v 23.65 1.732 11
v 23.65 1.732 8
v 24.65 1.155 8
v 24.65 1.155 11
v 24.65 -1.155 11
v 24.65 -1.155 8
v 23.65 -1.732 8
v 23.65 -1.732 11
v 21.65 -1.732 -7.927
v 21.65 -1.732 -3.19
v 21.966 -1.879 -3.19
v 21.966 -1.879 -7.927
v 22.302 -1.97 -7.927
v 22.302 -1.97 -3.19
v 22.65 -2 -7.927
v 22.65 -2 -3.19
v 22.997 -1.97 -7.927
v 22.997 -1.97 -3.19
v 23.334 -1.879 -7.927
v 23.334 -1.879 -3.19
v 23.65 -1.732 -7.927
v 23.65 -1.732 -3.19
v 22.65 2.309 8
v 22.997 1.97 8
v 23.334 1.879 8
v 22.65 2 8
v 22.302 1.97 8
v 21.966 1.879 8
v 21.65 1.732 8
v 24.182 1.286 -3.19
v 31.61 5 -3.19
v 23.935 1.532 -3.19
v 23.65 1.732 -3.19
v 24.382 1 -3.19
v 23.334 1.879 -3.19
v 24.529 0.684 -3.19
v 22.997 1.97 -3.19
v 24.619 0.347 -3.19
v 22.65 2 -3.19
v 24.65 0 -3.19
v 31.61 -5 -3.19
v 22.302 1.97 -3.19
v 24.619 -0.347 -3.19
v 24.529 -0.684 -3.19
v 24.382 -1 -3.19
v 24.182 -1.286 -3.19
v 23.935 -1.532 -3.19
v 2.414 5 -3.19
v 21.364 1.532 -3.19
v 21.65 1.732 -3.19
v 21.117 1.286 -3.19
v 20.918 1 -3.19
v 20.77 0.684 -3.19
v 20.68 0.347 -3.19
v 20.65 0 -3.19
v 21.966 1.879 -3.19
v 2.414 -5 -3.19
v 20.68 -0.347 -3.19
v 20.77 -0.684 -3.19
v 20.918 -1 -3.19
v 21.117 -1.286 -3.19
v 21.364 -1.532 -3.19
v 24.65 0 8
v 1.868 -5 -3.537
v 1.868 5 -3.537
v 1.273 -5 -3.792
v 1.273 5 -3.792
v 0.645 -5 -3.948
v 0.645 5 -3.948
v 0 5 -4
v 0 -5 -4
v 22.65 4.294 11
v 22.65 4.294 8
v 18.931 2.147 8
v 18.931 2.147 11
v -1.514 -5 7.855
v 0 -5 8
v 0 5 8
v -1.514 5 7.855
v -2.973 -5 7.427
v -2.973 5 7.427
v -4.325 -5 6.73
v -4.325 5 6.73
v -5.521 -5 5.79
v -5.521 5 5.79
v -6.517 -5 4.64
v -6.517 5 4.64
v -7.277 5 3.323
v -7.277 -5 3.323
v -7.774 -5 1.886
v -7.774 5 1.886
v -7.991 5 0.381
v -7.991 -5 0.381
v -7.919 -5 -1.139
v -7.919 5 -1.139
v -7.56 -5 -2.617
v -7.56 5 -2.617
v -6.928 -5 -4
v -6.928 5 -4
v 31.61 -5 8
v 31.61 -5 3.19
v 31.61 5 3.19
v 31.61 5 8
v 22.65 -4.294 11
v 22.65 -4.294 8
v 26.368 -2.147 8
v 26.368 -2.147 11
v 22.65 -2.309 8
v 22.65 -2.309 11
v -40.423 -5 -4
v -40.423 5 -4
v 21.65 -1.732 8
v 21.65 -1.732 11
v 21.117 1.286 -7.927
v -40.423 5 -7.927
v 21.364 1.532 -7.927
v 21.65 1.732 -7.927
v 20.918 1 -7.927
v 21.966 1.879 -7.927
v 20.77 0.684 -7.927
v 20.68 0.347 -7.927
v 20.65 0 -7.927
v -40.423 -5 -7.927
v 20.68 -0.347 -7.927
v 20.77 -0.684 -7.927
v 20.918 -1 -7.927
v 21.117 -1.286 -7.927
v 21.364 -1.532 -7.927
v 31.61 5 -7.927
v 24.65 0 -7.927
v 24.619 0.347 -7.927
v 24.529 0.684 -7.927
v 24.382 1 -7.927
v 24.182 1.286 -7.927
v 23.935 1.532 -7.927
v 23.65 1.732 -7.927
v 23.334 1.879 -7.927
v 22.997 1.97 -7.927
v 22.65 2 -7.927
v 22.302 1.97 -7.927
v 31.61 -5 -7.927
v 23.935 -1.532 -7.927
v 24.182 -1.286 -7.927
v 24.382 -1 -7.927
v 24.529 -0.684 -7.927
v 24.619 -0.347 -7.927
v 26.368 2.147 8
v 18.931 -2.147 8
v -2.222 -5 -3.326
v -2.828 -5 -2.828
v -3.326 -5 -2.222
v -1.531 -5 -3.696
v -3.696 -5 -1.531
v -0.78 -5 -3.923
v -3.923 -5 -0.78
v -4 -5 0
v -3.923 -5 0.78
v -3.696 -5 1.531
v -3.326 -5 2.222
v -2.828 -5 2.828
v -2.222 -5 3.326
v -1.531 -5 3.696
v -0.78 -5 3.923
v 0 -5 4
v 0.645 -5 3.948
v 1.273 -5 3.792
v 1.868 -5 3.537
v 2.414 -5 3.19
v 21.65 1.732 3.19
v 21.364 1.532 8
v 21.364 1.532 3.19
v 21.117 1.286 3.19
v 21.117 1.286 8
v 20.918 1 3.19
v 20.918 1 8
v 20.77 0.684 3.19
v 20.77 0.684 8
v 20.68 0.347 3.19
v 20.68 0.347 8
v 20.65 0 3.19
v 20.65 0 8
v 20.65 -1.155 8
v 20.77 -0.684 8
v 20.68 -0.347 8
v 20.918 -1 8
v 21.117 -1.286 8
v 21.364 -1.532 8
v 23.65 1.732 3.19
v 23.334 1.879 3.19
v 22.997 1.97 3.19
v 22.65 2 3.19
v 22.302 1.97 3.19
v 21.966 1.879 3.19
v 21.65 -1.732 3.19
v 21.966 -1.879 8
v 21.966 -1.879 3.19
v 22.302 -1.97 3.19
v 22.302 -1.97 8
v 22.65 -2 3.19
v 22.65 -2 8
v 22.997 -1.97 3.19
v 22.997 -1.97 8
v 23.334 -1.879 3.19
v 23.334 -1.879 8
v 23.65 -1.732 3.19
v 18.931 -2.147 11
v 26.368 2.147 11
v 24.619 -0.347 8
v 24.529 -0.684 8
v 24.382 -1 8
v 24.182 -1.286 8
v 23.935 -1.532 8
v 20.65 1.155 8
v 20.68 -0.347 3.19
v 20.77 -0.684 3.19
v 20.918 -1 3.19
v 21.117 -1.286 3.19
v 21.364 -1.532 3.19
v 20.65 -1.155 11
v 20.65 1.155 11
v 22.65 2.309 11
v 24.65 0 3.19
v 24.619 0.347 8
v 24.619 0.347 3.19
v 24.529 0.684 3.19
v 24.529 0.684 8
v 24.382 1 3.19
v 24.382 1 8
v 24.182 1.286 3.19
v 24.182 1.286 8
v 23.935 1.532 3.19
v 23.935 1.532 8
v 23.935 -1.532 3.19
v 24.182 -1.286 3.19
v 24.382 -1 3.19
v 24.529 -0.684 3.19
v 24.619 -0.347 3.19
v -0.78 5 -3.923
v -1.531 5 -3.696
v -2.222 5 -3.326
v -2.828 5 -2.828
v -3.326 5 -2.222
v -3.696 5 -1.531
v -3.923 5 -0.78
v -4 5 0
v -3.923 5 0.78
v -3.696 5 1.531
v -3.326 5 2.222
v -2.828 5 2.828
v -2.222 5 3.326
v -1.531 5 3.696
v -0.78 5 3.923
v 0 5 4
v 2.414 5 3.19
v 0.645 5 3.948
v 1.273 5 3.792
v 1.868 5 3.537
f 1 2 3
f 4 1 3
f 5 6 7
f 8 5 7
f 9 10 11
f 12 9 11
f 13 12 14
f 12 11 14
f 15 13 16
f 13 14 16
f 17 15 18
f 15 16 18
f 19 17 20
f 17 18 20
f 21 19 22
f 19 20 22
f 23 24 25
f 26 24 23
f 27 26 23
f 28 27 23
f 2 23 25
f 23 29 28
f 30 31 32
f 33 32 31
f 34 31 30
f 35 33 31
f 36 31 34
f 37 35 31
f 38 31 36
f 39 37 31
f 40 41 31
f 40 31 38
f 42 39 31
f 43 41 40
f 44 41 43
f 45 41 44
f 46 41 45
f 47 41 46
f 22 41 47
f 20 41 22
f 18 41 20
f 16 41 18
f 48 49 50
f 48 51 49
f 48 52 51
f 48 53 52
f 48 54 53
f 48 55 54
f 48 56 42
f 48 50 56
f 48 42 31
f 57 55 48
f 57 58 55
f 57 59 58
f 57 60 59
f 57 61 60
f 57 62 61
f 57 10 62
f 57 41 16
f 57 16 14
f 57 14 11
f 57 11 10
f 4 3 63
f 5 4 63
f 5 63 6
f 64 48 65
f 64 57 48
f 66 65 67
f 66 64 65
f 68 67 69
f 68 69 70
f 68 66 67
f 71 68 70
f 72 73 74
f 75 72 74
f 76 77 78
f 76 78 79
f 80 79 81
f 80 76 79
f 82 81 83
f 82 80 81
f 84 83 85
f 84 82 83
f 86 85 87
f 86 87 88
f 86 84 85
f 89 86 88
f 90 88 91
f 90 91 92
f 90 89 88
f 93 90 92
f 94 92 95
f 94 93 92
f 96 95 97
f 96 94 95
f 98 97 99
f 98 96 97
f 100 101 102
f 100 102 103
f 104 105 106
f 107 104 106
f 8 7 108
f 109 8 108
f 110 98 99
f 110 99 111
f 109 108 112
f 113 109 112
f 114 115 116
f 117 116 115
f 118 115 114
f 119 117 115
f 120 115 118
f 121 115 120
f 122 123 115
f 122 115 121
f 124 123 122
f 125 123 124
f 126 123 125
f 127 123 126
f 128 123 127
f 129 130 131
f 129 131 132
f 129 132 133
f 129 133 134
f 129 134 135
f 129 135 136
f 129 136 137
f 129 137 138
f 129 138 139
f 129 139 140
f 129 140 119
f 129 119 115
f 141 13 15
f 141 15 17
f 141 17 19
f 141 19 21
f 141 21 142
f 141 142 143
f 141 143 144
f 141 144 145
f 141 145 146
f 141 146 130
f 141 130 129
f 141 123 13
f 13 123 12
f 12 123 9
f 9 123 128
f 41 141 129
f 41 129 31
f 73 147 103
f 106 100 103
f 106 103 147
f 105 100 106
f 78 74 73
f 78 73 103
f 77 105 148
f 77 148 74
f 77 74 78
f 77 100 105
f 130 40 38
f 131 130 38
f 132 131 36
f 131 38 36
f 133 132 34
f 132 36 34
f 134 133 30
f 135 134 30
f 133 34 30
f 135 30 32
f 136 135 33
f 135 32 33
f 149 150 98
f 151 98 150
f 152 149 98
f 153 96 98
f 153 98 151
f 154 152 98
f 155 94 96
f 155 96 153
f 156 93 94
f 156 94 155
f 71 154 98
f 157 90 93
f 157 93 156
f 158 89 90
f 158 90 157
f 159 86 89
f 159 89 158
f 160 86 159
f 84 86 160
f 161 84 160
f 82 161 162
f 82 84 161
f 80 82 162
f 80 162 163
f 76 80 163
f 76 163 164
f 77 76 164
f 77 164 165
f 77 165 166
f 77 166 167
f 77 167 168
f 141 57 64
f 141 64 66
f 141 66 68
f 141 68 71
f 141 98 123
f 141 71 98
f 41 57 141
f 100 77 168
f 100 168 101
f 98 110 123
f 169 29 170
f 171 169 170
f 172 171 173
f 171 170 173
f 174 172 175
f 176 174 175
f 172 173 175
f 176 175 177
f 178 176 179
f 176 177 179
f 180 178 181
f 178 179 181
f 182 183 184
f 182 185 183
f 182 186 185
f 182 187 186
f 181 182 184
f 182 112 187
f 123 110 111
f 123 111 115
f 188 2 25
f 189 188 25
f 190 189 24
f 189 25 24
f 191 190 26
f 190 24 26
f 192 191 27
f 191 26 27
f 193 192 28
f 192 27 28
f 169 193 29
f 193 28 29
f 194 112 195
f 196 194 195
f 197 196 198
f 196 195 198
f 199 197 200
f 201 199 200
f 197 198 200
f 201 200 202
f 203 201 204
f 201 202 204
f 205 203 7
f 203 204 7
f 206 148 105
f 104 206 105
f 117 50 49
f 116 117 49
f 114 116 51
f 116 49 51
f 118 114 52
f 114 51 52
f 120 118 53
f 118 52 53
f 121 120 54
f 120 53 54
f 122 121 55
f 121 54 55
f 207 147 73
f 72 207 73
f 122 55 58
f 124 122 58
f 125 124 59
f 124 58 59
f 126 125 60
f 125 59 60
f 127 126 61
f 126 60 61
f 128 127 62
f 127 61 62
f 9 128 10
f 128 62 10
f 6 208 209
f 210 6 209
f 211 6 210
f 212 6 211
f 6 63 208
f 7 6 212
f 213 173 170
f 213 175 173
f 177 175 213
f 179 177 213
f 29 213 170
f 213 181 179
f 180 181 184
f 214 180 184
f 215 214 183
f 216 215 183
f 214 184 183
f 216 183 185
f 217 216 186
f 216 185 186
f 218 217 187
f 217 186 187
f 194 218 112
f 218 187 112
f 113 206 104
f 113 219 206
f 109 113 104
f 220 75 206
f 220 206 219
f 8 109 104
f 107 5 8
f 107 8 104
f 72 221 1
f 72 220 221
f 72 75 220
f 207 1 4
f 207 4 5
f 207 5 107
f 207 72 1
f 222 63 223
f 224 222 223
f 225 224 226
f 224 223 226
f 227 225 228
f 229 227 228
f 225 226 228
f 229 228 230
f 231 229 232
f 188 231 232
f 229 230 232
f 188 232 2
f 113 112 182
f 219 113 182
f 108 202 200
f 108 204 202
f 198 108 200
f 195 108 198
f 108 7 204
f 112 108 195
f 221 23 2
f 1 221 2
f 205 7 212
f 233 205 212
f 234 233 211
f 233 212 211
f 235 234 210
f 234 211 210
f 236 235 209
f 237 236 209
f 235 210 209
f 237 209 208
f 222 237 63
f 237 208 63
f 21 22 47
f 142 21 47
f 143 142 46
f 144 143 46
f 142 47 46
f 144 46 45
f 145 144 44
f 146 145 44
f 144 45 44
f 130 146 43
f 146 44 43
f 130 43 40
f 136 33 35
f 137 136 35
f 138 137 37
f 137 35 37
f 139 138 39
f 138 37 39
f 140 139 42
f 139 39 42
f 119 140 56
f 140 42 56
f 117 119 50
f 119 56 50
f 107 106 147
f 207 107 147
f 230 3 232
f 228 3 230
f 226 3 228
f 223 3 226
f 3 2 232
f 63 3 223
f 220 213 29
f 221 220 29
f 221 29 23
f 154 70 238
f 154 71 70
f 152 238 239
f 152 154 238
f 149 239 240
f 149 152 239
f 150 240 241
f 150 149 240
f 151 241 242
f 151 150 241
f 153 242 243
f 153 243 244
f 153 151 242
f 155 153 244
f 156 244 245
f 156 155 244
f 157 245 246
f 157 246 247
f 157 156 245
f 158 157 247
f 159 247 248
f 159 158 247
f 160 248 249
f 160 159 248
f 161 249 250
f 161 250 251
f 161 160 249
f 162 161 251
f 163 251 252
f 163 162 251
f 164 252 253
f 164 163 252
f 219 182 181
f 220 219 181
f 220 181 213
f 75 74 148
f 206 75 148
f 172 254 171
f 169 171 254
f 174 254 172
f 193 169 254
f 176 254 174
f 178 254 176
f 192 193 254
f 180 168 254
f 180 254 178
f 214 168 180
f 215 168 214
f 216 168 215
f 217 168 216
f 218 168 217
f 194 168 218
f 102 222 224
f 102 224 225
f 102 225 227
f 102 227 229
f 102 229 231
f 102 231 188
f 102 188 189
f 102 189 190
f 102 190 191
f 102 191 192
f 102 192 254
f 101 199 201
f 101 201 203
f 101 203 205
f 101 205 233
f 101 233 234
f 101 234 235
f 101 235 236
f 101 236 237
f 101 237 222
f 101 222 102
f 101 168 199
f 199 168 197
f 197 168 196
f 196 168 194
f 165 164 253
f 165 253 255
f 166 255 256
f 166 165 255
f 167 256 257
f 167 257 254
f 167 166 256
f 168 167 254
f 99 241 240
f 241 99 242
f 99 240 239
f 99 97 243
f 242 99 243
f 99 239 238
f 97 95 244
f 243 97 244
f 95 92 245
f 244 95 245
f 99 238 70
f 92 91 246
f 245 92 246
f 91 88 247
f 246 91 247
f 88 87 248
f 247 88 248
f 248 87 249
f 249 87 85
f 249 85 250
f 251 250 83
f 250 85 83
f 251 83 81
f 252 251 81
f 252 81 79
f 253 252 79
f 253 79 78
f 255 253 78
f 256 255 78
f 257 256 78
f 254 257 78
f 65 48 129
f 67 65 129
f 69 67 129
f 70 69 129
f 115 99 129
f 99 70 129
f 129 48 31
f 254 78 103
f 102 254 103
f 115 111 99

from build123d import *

# Parameters (mm, degrees)
F1_DEPTH = 5
F3_DEPTH = 3
F4_DEPTH = 16


with BuildPart() as f1:
    # F0 (on Front) → F1 (new body, symmetric)
    with BuildSketch(Plane.XZ):
        with BuildLine():
            ThreePointArc((0, -4), (-4, 0), (0, 4))
            Line((0, 4), (0, 8))
            ThreePointArc((0, 8), (-6.9282032303, 4), (-6.9282032303, -4))
            Line((-6.9282032303, -4), (0, -4))
        make_face()
        with BuildLine():
            Line((31.6095426679, 8), (0, 8))
            ThreePointArc((0, 8), (4, 6.9282032303), (6.9282032303, 4))
            Line((6.9282032303, 4), (31.6095426679, 4))
            Line((31.6095426679, 4), (31.6095426679, 8))
        make_face()
        with BuildLine():
            Line((0, 8), (0, 4))
            Line((0, 4), (2.413712136, 4))
            Line((2.413712136, 4), (6.9282032303, 4))
            ThreePointArc((6.9282032303, 4), (4, 6.9282032303), (0, 8))
        make_face()
        with BuildLine():
            Line((31.6095426679, -4), (6.9282032303, -4))
            ThreePointArc((6.9282032303, -4), (4.4598401279, -6.6415228701), (1.0806620306, -7.9266745597))
            Line((1.0806620306, -7.9266745597), (31.6095426679, -7.9266745597))
            Line((31.6095426679, -7.9266745597), (31.6095426679, -4))
        make_face()
        with BuildLine():
            ThreePointArc((-1.0806620306, -7.9266745597), (-4.4598401279, -6.6415228701), (-6.9282032303, -4))
            Line((-6.9282032303, -4), (-40.4233634472, -4))
            Line((-40.4233634472, -4), (-40.4233634472, -7.9266745597))
            Line((-40.4233634472, -7.9266745597), (-1.0806620306, -7.9266745597))
        make_face()
        with BuildLine():
            Line((0, -7.9266745597), (0, -4))
            Line((0, -4), (-6.9282032303, -4))
            ThreePointArc((-6.9282032303, -4), (-4.4598401279, -6.6415228701), (-1.0806620306, -7.9266745597))
            Line((-1.0806620306, -7.9266745597), (0, -7.9266745597))
        make_face()
        with BuildLine():
            Line((2.413712136, -4), (0, -4))
            Line((0, -4), (0, -7.9266745597))
            Line((0, -7.9266745597), (1.0806620306, -7.9266745597))
            ThreePointArc((1.0806620306, -7.9266745597), (4.4598401279, -6.6415228701), (6.9282032303, -4))
            Line((6.9282032303, -4), (2.413712136, -4))
        make_face()
        with BuildLine():
            Line((2.413712136, 4), (2.413712136, 3.1896698457))
            Line((2.413712136, 3.1896698457), (7.3366209031, 3.1896698457))
            ThreePointArc((7.3366209031, 3.1896698457), (7.1439107377, 3.6006304131), (6.9282032303, 4))
            Line((6.9282032303, 4), (2.413712136, 4))
        make_face()
        with BuildLine():
            ThreePointArc((6.9282032303, 4), (7.1439107377, 3.6006304131), (7.3366209031, 3.1896698457))
            Line((7.3366209031, 3.1896698457), (31.6095426679, 3.1896698457))
            Line((31.6095426679, 3.1896698457), (31.6095426679, 4))
            Line((31.6095426679, 4), (6.9282032303, 4))
        make_face()
        with BuildLine():
            Line((7.3366209031, -3.1896698457), (2.413712136, -3.1896698457))
            Line((2.413712136, -3.1896698457), (2.413712136, -4))
            Line((2.413712136, -4), (6.9282032303, -4))
            ThreePointArc((6.9282032303, -4), (7.1439107377, -3.6006304131), (7.3366209031, -3.1896698457))
        make_face()
        with BuildLine():
            Line((2.413712136, -4), (2.413712136, -3.1896698457))
            ThreePointArc((2.413712136, -3.1896698457), (1.2730515734, -3.7920099804), (0, -4))
            Line((0, -4), (2.413712136, -4))
        make_face()
        with BuildLine():
            ThreePointArc((0, 4), (1.2730515734, 3.7920099804), (2.413712136, 3.1896698457))
            Line((2.413712136, 3.1896698457), (2.413712136, 4))
            Line((2.413712136, 4), (0, 4))
        make_face()
        with BuildLine():
            Line((31.6095426679, -3.1896698457), (7.3366209031, -3.1896698457))
            ThreePointArc((7.3366209031, -3.1896698457), (7.1439107377, -3.6006304131), (6.9282032303, -4))
            Line((6.9282032303, -4), (31.6095426679, -4))
            Line((31.6095426679, -4), (31.6095426679, -3.1896698457))
        make_face()
    extrude(amount=F1_DEPTH, both=True)

    # F2 (on face) → F3 (join)
    with BuildSketch(Plane.XY.offset(8)):
        Polygon((26.3679362833, -2.1467979489), (26.3679362833, 2.1467979489), (22.6495731622, 4.2935958979), (18.931210041, 2.1467979489), (18.931210041, -2.1467979489), (22.6495731622, -4.2935958979), align=None)
        Polygon((23.6495732055, 1.7320507826), (24.6495731622, 1.1547005384), (24.6495731622, 0), (24.6495731622, -1.1547005384), (23.6495731174, -1.7320508334), (22.6495731622, -2.3094010768), (21.6495731189, -1.7320507826), (20.6495731622, -1.1547005384), (20.6495731622, 0), (20.6495731622, 1.1547005384), (21.6495731525, 1.732050802), (22.6495731622, 2.3094010768), align=None, mode=Mode.SUBTRACT)
    extrude(amount=F3_DEPTH)

    # F2 (on face) → F4 (cut)
    with BuildSketch(Plane.XY.offset(8)):
        with BuildLine():
            ThreePointArc((23.6495731174, -1.7320508334), (24.3816239568, -1.0000000224), (24.6495731622, 0))
            ThreePointArc((24.6495731622, 0), (24.3816239823, 0.9999999783), (23.6495732055, 1.7320507826))
            ThreePointArc((23.6495732055, 1.7320507826), (22.6495731816, 2), (21.6495731525, 1.732050802))
            ThreePointArc((21.6495731525, 1.732050802), (20.9175223518, 0.9999999952), (20.6495731622, 0))
            ThreePointArc((20.6495731622, 0), (20.9175223421, -0.9999999783), (21.6495731189, -1.7320507826))
            ThreePointArc((21.6495731189, -1.7320507826), (22.6495731113, -2), (23.6495731174, -1.7320508334))
        make_face()
    extrude(amount=-F4_DEPTH, mode=Mode.SUBTRACT)


solid = f1.part
